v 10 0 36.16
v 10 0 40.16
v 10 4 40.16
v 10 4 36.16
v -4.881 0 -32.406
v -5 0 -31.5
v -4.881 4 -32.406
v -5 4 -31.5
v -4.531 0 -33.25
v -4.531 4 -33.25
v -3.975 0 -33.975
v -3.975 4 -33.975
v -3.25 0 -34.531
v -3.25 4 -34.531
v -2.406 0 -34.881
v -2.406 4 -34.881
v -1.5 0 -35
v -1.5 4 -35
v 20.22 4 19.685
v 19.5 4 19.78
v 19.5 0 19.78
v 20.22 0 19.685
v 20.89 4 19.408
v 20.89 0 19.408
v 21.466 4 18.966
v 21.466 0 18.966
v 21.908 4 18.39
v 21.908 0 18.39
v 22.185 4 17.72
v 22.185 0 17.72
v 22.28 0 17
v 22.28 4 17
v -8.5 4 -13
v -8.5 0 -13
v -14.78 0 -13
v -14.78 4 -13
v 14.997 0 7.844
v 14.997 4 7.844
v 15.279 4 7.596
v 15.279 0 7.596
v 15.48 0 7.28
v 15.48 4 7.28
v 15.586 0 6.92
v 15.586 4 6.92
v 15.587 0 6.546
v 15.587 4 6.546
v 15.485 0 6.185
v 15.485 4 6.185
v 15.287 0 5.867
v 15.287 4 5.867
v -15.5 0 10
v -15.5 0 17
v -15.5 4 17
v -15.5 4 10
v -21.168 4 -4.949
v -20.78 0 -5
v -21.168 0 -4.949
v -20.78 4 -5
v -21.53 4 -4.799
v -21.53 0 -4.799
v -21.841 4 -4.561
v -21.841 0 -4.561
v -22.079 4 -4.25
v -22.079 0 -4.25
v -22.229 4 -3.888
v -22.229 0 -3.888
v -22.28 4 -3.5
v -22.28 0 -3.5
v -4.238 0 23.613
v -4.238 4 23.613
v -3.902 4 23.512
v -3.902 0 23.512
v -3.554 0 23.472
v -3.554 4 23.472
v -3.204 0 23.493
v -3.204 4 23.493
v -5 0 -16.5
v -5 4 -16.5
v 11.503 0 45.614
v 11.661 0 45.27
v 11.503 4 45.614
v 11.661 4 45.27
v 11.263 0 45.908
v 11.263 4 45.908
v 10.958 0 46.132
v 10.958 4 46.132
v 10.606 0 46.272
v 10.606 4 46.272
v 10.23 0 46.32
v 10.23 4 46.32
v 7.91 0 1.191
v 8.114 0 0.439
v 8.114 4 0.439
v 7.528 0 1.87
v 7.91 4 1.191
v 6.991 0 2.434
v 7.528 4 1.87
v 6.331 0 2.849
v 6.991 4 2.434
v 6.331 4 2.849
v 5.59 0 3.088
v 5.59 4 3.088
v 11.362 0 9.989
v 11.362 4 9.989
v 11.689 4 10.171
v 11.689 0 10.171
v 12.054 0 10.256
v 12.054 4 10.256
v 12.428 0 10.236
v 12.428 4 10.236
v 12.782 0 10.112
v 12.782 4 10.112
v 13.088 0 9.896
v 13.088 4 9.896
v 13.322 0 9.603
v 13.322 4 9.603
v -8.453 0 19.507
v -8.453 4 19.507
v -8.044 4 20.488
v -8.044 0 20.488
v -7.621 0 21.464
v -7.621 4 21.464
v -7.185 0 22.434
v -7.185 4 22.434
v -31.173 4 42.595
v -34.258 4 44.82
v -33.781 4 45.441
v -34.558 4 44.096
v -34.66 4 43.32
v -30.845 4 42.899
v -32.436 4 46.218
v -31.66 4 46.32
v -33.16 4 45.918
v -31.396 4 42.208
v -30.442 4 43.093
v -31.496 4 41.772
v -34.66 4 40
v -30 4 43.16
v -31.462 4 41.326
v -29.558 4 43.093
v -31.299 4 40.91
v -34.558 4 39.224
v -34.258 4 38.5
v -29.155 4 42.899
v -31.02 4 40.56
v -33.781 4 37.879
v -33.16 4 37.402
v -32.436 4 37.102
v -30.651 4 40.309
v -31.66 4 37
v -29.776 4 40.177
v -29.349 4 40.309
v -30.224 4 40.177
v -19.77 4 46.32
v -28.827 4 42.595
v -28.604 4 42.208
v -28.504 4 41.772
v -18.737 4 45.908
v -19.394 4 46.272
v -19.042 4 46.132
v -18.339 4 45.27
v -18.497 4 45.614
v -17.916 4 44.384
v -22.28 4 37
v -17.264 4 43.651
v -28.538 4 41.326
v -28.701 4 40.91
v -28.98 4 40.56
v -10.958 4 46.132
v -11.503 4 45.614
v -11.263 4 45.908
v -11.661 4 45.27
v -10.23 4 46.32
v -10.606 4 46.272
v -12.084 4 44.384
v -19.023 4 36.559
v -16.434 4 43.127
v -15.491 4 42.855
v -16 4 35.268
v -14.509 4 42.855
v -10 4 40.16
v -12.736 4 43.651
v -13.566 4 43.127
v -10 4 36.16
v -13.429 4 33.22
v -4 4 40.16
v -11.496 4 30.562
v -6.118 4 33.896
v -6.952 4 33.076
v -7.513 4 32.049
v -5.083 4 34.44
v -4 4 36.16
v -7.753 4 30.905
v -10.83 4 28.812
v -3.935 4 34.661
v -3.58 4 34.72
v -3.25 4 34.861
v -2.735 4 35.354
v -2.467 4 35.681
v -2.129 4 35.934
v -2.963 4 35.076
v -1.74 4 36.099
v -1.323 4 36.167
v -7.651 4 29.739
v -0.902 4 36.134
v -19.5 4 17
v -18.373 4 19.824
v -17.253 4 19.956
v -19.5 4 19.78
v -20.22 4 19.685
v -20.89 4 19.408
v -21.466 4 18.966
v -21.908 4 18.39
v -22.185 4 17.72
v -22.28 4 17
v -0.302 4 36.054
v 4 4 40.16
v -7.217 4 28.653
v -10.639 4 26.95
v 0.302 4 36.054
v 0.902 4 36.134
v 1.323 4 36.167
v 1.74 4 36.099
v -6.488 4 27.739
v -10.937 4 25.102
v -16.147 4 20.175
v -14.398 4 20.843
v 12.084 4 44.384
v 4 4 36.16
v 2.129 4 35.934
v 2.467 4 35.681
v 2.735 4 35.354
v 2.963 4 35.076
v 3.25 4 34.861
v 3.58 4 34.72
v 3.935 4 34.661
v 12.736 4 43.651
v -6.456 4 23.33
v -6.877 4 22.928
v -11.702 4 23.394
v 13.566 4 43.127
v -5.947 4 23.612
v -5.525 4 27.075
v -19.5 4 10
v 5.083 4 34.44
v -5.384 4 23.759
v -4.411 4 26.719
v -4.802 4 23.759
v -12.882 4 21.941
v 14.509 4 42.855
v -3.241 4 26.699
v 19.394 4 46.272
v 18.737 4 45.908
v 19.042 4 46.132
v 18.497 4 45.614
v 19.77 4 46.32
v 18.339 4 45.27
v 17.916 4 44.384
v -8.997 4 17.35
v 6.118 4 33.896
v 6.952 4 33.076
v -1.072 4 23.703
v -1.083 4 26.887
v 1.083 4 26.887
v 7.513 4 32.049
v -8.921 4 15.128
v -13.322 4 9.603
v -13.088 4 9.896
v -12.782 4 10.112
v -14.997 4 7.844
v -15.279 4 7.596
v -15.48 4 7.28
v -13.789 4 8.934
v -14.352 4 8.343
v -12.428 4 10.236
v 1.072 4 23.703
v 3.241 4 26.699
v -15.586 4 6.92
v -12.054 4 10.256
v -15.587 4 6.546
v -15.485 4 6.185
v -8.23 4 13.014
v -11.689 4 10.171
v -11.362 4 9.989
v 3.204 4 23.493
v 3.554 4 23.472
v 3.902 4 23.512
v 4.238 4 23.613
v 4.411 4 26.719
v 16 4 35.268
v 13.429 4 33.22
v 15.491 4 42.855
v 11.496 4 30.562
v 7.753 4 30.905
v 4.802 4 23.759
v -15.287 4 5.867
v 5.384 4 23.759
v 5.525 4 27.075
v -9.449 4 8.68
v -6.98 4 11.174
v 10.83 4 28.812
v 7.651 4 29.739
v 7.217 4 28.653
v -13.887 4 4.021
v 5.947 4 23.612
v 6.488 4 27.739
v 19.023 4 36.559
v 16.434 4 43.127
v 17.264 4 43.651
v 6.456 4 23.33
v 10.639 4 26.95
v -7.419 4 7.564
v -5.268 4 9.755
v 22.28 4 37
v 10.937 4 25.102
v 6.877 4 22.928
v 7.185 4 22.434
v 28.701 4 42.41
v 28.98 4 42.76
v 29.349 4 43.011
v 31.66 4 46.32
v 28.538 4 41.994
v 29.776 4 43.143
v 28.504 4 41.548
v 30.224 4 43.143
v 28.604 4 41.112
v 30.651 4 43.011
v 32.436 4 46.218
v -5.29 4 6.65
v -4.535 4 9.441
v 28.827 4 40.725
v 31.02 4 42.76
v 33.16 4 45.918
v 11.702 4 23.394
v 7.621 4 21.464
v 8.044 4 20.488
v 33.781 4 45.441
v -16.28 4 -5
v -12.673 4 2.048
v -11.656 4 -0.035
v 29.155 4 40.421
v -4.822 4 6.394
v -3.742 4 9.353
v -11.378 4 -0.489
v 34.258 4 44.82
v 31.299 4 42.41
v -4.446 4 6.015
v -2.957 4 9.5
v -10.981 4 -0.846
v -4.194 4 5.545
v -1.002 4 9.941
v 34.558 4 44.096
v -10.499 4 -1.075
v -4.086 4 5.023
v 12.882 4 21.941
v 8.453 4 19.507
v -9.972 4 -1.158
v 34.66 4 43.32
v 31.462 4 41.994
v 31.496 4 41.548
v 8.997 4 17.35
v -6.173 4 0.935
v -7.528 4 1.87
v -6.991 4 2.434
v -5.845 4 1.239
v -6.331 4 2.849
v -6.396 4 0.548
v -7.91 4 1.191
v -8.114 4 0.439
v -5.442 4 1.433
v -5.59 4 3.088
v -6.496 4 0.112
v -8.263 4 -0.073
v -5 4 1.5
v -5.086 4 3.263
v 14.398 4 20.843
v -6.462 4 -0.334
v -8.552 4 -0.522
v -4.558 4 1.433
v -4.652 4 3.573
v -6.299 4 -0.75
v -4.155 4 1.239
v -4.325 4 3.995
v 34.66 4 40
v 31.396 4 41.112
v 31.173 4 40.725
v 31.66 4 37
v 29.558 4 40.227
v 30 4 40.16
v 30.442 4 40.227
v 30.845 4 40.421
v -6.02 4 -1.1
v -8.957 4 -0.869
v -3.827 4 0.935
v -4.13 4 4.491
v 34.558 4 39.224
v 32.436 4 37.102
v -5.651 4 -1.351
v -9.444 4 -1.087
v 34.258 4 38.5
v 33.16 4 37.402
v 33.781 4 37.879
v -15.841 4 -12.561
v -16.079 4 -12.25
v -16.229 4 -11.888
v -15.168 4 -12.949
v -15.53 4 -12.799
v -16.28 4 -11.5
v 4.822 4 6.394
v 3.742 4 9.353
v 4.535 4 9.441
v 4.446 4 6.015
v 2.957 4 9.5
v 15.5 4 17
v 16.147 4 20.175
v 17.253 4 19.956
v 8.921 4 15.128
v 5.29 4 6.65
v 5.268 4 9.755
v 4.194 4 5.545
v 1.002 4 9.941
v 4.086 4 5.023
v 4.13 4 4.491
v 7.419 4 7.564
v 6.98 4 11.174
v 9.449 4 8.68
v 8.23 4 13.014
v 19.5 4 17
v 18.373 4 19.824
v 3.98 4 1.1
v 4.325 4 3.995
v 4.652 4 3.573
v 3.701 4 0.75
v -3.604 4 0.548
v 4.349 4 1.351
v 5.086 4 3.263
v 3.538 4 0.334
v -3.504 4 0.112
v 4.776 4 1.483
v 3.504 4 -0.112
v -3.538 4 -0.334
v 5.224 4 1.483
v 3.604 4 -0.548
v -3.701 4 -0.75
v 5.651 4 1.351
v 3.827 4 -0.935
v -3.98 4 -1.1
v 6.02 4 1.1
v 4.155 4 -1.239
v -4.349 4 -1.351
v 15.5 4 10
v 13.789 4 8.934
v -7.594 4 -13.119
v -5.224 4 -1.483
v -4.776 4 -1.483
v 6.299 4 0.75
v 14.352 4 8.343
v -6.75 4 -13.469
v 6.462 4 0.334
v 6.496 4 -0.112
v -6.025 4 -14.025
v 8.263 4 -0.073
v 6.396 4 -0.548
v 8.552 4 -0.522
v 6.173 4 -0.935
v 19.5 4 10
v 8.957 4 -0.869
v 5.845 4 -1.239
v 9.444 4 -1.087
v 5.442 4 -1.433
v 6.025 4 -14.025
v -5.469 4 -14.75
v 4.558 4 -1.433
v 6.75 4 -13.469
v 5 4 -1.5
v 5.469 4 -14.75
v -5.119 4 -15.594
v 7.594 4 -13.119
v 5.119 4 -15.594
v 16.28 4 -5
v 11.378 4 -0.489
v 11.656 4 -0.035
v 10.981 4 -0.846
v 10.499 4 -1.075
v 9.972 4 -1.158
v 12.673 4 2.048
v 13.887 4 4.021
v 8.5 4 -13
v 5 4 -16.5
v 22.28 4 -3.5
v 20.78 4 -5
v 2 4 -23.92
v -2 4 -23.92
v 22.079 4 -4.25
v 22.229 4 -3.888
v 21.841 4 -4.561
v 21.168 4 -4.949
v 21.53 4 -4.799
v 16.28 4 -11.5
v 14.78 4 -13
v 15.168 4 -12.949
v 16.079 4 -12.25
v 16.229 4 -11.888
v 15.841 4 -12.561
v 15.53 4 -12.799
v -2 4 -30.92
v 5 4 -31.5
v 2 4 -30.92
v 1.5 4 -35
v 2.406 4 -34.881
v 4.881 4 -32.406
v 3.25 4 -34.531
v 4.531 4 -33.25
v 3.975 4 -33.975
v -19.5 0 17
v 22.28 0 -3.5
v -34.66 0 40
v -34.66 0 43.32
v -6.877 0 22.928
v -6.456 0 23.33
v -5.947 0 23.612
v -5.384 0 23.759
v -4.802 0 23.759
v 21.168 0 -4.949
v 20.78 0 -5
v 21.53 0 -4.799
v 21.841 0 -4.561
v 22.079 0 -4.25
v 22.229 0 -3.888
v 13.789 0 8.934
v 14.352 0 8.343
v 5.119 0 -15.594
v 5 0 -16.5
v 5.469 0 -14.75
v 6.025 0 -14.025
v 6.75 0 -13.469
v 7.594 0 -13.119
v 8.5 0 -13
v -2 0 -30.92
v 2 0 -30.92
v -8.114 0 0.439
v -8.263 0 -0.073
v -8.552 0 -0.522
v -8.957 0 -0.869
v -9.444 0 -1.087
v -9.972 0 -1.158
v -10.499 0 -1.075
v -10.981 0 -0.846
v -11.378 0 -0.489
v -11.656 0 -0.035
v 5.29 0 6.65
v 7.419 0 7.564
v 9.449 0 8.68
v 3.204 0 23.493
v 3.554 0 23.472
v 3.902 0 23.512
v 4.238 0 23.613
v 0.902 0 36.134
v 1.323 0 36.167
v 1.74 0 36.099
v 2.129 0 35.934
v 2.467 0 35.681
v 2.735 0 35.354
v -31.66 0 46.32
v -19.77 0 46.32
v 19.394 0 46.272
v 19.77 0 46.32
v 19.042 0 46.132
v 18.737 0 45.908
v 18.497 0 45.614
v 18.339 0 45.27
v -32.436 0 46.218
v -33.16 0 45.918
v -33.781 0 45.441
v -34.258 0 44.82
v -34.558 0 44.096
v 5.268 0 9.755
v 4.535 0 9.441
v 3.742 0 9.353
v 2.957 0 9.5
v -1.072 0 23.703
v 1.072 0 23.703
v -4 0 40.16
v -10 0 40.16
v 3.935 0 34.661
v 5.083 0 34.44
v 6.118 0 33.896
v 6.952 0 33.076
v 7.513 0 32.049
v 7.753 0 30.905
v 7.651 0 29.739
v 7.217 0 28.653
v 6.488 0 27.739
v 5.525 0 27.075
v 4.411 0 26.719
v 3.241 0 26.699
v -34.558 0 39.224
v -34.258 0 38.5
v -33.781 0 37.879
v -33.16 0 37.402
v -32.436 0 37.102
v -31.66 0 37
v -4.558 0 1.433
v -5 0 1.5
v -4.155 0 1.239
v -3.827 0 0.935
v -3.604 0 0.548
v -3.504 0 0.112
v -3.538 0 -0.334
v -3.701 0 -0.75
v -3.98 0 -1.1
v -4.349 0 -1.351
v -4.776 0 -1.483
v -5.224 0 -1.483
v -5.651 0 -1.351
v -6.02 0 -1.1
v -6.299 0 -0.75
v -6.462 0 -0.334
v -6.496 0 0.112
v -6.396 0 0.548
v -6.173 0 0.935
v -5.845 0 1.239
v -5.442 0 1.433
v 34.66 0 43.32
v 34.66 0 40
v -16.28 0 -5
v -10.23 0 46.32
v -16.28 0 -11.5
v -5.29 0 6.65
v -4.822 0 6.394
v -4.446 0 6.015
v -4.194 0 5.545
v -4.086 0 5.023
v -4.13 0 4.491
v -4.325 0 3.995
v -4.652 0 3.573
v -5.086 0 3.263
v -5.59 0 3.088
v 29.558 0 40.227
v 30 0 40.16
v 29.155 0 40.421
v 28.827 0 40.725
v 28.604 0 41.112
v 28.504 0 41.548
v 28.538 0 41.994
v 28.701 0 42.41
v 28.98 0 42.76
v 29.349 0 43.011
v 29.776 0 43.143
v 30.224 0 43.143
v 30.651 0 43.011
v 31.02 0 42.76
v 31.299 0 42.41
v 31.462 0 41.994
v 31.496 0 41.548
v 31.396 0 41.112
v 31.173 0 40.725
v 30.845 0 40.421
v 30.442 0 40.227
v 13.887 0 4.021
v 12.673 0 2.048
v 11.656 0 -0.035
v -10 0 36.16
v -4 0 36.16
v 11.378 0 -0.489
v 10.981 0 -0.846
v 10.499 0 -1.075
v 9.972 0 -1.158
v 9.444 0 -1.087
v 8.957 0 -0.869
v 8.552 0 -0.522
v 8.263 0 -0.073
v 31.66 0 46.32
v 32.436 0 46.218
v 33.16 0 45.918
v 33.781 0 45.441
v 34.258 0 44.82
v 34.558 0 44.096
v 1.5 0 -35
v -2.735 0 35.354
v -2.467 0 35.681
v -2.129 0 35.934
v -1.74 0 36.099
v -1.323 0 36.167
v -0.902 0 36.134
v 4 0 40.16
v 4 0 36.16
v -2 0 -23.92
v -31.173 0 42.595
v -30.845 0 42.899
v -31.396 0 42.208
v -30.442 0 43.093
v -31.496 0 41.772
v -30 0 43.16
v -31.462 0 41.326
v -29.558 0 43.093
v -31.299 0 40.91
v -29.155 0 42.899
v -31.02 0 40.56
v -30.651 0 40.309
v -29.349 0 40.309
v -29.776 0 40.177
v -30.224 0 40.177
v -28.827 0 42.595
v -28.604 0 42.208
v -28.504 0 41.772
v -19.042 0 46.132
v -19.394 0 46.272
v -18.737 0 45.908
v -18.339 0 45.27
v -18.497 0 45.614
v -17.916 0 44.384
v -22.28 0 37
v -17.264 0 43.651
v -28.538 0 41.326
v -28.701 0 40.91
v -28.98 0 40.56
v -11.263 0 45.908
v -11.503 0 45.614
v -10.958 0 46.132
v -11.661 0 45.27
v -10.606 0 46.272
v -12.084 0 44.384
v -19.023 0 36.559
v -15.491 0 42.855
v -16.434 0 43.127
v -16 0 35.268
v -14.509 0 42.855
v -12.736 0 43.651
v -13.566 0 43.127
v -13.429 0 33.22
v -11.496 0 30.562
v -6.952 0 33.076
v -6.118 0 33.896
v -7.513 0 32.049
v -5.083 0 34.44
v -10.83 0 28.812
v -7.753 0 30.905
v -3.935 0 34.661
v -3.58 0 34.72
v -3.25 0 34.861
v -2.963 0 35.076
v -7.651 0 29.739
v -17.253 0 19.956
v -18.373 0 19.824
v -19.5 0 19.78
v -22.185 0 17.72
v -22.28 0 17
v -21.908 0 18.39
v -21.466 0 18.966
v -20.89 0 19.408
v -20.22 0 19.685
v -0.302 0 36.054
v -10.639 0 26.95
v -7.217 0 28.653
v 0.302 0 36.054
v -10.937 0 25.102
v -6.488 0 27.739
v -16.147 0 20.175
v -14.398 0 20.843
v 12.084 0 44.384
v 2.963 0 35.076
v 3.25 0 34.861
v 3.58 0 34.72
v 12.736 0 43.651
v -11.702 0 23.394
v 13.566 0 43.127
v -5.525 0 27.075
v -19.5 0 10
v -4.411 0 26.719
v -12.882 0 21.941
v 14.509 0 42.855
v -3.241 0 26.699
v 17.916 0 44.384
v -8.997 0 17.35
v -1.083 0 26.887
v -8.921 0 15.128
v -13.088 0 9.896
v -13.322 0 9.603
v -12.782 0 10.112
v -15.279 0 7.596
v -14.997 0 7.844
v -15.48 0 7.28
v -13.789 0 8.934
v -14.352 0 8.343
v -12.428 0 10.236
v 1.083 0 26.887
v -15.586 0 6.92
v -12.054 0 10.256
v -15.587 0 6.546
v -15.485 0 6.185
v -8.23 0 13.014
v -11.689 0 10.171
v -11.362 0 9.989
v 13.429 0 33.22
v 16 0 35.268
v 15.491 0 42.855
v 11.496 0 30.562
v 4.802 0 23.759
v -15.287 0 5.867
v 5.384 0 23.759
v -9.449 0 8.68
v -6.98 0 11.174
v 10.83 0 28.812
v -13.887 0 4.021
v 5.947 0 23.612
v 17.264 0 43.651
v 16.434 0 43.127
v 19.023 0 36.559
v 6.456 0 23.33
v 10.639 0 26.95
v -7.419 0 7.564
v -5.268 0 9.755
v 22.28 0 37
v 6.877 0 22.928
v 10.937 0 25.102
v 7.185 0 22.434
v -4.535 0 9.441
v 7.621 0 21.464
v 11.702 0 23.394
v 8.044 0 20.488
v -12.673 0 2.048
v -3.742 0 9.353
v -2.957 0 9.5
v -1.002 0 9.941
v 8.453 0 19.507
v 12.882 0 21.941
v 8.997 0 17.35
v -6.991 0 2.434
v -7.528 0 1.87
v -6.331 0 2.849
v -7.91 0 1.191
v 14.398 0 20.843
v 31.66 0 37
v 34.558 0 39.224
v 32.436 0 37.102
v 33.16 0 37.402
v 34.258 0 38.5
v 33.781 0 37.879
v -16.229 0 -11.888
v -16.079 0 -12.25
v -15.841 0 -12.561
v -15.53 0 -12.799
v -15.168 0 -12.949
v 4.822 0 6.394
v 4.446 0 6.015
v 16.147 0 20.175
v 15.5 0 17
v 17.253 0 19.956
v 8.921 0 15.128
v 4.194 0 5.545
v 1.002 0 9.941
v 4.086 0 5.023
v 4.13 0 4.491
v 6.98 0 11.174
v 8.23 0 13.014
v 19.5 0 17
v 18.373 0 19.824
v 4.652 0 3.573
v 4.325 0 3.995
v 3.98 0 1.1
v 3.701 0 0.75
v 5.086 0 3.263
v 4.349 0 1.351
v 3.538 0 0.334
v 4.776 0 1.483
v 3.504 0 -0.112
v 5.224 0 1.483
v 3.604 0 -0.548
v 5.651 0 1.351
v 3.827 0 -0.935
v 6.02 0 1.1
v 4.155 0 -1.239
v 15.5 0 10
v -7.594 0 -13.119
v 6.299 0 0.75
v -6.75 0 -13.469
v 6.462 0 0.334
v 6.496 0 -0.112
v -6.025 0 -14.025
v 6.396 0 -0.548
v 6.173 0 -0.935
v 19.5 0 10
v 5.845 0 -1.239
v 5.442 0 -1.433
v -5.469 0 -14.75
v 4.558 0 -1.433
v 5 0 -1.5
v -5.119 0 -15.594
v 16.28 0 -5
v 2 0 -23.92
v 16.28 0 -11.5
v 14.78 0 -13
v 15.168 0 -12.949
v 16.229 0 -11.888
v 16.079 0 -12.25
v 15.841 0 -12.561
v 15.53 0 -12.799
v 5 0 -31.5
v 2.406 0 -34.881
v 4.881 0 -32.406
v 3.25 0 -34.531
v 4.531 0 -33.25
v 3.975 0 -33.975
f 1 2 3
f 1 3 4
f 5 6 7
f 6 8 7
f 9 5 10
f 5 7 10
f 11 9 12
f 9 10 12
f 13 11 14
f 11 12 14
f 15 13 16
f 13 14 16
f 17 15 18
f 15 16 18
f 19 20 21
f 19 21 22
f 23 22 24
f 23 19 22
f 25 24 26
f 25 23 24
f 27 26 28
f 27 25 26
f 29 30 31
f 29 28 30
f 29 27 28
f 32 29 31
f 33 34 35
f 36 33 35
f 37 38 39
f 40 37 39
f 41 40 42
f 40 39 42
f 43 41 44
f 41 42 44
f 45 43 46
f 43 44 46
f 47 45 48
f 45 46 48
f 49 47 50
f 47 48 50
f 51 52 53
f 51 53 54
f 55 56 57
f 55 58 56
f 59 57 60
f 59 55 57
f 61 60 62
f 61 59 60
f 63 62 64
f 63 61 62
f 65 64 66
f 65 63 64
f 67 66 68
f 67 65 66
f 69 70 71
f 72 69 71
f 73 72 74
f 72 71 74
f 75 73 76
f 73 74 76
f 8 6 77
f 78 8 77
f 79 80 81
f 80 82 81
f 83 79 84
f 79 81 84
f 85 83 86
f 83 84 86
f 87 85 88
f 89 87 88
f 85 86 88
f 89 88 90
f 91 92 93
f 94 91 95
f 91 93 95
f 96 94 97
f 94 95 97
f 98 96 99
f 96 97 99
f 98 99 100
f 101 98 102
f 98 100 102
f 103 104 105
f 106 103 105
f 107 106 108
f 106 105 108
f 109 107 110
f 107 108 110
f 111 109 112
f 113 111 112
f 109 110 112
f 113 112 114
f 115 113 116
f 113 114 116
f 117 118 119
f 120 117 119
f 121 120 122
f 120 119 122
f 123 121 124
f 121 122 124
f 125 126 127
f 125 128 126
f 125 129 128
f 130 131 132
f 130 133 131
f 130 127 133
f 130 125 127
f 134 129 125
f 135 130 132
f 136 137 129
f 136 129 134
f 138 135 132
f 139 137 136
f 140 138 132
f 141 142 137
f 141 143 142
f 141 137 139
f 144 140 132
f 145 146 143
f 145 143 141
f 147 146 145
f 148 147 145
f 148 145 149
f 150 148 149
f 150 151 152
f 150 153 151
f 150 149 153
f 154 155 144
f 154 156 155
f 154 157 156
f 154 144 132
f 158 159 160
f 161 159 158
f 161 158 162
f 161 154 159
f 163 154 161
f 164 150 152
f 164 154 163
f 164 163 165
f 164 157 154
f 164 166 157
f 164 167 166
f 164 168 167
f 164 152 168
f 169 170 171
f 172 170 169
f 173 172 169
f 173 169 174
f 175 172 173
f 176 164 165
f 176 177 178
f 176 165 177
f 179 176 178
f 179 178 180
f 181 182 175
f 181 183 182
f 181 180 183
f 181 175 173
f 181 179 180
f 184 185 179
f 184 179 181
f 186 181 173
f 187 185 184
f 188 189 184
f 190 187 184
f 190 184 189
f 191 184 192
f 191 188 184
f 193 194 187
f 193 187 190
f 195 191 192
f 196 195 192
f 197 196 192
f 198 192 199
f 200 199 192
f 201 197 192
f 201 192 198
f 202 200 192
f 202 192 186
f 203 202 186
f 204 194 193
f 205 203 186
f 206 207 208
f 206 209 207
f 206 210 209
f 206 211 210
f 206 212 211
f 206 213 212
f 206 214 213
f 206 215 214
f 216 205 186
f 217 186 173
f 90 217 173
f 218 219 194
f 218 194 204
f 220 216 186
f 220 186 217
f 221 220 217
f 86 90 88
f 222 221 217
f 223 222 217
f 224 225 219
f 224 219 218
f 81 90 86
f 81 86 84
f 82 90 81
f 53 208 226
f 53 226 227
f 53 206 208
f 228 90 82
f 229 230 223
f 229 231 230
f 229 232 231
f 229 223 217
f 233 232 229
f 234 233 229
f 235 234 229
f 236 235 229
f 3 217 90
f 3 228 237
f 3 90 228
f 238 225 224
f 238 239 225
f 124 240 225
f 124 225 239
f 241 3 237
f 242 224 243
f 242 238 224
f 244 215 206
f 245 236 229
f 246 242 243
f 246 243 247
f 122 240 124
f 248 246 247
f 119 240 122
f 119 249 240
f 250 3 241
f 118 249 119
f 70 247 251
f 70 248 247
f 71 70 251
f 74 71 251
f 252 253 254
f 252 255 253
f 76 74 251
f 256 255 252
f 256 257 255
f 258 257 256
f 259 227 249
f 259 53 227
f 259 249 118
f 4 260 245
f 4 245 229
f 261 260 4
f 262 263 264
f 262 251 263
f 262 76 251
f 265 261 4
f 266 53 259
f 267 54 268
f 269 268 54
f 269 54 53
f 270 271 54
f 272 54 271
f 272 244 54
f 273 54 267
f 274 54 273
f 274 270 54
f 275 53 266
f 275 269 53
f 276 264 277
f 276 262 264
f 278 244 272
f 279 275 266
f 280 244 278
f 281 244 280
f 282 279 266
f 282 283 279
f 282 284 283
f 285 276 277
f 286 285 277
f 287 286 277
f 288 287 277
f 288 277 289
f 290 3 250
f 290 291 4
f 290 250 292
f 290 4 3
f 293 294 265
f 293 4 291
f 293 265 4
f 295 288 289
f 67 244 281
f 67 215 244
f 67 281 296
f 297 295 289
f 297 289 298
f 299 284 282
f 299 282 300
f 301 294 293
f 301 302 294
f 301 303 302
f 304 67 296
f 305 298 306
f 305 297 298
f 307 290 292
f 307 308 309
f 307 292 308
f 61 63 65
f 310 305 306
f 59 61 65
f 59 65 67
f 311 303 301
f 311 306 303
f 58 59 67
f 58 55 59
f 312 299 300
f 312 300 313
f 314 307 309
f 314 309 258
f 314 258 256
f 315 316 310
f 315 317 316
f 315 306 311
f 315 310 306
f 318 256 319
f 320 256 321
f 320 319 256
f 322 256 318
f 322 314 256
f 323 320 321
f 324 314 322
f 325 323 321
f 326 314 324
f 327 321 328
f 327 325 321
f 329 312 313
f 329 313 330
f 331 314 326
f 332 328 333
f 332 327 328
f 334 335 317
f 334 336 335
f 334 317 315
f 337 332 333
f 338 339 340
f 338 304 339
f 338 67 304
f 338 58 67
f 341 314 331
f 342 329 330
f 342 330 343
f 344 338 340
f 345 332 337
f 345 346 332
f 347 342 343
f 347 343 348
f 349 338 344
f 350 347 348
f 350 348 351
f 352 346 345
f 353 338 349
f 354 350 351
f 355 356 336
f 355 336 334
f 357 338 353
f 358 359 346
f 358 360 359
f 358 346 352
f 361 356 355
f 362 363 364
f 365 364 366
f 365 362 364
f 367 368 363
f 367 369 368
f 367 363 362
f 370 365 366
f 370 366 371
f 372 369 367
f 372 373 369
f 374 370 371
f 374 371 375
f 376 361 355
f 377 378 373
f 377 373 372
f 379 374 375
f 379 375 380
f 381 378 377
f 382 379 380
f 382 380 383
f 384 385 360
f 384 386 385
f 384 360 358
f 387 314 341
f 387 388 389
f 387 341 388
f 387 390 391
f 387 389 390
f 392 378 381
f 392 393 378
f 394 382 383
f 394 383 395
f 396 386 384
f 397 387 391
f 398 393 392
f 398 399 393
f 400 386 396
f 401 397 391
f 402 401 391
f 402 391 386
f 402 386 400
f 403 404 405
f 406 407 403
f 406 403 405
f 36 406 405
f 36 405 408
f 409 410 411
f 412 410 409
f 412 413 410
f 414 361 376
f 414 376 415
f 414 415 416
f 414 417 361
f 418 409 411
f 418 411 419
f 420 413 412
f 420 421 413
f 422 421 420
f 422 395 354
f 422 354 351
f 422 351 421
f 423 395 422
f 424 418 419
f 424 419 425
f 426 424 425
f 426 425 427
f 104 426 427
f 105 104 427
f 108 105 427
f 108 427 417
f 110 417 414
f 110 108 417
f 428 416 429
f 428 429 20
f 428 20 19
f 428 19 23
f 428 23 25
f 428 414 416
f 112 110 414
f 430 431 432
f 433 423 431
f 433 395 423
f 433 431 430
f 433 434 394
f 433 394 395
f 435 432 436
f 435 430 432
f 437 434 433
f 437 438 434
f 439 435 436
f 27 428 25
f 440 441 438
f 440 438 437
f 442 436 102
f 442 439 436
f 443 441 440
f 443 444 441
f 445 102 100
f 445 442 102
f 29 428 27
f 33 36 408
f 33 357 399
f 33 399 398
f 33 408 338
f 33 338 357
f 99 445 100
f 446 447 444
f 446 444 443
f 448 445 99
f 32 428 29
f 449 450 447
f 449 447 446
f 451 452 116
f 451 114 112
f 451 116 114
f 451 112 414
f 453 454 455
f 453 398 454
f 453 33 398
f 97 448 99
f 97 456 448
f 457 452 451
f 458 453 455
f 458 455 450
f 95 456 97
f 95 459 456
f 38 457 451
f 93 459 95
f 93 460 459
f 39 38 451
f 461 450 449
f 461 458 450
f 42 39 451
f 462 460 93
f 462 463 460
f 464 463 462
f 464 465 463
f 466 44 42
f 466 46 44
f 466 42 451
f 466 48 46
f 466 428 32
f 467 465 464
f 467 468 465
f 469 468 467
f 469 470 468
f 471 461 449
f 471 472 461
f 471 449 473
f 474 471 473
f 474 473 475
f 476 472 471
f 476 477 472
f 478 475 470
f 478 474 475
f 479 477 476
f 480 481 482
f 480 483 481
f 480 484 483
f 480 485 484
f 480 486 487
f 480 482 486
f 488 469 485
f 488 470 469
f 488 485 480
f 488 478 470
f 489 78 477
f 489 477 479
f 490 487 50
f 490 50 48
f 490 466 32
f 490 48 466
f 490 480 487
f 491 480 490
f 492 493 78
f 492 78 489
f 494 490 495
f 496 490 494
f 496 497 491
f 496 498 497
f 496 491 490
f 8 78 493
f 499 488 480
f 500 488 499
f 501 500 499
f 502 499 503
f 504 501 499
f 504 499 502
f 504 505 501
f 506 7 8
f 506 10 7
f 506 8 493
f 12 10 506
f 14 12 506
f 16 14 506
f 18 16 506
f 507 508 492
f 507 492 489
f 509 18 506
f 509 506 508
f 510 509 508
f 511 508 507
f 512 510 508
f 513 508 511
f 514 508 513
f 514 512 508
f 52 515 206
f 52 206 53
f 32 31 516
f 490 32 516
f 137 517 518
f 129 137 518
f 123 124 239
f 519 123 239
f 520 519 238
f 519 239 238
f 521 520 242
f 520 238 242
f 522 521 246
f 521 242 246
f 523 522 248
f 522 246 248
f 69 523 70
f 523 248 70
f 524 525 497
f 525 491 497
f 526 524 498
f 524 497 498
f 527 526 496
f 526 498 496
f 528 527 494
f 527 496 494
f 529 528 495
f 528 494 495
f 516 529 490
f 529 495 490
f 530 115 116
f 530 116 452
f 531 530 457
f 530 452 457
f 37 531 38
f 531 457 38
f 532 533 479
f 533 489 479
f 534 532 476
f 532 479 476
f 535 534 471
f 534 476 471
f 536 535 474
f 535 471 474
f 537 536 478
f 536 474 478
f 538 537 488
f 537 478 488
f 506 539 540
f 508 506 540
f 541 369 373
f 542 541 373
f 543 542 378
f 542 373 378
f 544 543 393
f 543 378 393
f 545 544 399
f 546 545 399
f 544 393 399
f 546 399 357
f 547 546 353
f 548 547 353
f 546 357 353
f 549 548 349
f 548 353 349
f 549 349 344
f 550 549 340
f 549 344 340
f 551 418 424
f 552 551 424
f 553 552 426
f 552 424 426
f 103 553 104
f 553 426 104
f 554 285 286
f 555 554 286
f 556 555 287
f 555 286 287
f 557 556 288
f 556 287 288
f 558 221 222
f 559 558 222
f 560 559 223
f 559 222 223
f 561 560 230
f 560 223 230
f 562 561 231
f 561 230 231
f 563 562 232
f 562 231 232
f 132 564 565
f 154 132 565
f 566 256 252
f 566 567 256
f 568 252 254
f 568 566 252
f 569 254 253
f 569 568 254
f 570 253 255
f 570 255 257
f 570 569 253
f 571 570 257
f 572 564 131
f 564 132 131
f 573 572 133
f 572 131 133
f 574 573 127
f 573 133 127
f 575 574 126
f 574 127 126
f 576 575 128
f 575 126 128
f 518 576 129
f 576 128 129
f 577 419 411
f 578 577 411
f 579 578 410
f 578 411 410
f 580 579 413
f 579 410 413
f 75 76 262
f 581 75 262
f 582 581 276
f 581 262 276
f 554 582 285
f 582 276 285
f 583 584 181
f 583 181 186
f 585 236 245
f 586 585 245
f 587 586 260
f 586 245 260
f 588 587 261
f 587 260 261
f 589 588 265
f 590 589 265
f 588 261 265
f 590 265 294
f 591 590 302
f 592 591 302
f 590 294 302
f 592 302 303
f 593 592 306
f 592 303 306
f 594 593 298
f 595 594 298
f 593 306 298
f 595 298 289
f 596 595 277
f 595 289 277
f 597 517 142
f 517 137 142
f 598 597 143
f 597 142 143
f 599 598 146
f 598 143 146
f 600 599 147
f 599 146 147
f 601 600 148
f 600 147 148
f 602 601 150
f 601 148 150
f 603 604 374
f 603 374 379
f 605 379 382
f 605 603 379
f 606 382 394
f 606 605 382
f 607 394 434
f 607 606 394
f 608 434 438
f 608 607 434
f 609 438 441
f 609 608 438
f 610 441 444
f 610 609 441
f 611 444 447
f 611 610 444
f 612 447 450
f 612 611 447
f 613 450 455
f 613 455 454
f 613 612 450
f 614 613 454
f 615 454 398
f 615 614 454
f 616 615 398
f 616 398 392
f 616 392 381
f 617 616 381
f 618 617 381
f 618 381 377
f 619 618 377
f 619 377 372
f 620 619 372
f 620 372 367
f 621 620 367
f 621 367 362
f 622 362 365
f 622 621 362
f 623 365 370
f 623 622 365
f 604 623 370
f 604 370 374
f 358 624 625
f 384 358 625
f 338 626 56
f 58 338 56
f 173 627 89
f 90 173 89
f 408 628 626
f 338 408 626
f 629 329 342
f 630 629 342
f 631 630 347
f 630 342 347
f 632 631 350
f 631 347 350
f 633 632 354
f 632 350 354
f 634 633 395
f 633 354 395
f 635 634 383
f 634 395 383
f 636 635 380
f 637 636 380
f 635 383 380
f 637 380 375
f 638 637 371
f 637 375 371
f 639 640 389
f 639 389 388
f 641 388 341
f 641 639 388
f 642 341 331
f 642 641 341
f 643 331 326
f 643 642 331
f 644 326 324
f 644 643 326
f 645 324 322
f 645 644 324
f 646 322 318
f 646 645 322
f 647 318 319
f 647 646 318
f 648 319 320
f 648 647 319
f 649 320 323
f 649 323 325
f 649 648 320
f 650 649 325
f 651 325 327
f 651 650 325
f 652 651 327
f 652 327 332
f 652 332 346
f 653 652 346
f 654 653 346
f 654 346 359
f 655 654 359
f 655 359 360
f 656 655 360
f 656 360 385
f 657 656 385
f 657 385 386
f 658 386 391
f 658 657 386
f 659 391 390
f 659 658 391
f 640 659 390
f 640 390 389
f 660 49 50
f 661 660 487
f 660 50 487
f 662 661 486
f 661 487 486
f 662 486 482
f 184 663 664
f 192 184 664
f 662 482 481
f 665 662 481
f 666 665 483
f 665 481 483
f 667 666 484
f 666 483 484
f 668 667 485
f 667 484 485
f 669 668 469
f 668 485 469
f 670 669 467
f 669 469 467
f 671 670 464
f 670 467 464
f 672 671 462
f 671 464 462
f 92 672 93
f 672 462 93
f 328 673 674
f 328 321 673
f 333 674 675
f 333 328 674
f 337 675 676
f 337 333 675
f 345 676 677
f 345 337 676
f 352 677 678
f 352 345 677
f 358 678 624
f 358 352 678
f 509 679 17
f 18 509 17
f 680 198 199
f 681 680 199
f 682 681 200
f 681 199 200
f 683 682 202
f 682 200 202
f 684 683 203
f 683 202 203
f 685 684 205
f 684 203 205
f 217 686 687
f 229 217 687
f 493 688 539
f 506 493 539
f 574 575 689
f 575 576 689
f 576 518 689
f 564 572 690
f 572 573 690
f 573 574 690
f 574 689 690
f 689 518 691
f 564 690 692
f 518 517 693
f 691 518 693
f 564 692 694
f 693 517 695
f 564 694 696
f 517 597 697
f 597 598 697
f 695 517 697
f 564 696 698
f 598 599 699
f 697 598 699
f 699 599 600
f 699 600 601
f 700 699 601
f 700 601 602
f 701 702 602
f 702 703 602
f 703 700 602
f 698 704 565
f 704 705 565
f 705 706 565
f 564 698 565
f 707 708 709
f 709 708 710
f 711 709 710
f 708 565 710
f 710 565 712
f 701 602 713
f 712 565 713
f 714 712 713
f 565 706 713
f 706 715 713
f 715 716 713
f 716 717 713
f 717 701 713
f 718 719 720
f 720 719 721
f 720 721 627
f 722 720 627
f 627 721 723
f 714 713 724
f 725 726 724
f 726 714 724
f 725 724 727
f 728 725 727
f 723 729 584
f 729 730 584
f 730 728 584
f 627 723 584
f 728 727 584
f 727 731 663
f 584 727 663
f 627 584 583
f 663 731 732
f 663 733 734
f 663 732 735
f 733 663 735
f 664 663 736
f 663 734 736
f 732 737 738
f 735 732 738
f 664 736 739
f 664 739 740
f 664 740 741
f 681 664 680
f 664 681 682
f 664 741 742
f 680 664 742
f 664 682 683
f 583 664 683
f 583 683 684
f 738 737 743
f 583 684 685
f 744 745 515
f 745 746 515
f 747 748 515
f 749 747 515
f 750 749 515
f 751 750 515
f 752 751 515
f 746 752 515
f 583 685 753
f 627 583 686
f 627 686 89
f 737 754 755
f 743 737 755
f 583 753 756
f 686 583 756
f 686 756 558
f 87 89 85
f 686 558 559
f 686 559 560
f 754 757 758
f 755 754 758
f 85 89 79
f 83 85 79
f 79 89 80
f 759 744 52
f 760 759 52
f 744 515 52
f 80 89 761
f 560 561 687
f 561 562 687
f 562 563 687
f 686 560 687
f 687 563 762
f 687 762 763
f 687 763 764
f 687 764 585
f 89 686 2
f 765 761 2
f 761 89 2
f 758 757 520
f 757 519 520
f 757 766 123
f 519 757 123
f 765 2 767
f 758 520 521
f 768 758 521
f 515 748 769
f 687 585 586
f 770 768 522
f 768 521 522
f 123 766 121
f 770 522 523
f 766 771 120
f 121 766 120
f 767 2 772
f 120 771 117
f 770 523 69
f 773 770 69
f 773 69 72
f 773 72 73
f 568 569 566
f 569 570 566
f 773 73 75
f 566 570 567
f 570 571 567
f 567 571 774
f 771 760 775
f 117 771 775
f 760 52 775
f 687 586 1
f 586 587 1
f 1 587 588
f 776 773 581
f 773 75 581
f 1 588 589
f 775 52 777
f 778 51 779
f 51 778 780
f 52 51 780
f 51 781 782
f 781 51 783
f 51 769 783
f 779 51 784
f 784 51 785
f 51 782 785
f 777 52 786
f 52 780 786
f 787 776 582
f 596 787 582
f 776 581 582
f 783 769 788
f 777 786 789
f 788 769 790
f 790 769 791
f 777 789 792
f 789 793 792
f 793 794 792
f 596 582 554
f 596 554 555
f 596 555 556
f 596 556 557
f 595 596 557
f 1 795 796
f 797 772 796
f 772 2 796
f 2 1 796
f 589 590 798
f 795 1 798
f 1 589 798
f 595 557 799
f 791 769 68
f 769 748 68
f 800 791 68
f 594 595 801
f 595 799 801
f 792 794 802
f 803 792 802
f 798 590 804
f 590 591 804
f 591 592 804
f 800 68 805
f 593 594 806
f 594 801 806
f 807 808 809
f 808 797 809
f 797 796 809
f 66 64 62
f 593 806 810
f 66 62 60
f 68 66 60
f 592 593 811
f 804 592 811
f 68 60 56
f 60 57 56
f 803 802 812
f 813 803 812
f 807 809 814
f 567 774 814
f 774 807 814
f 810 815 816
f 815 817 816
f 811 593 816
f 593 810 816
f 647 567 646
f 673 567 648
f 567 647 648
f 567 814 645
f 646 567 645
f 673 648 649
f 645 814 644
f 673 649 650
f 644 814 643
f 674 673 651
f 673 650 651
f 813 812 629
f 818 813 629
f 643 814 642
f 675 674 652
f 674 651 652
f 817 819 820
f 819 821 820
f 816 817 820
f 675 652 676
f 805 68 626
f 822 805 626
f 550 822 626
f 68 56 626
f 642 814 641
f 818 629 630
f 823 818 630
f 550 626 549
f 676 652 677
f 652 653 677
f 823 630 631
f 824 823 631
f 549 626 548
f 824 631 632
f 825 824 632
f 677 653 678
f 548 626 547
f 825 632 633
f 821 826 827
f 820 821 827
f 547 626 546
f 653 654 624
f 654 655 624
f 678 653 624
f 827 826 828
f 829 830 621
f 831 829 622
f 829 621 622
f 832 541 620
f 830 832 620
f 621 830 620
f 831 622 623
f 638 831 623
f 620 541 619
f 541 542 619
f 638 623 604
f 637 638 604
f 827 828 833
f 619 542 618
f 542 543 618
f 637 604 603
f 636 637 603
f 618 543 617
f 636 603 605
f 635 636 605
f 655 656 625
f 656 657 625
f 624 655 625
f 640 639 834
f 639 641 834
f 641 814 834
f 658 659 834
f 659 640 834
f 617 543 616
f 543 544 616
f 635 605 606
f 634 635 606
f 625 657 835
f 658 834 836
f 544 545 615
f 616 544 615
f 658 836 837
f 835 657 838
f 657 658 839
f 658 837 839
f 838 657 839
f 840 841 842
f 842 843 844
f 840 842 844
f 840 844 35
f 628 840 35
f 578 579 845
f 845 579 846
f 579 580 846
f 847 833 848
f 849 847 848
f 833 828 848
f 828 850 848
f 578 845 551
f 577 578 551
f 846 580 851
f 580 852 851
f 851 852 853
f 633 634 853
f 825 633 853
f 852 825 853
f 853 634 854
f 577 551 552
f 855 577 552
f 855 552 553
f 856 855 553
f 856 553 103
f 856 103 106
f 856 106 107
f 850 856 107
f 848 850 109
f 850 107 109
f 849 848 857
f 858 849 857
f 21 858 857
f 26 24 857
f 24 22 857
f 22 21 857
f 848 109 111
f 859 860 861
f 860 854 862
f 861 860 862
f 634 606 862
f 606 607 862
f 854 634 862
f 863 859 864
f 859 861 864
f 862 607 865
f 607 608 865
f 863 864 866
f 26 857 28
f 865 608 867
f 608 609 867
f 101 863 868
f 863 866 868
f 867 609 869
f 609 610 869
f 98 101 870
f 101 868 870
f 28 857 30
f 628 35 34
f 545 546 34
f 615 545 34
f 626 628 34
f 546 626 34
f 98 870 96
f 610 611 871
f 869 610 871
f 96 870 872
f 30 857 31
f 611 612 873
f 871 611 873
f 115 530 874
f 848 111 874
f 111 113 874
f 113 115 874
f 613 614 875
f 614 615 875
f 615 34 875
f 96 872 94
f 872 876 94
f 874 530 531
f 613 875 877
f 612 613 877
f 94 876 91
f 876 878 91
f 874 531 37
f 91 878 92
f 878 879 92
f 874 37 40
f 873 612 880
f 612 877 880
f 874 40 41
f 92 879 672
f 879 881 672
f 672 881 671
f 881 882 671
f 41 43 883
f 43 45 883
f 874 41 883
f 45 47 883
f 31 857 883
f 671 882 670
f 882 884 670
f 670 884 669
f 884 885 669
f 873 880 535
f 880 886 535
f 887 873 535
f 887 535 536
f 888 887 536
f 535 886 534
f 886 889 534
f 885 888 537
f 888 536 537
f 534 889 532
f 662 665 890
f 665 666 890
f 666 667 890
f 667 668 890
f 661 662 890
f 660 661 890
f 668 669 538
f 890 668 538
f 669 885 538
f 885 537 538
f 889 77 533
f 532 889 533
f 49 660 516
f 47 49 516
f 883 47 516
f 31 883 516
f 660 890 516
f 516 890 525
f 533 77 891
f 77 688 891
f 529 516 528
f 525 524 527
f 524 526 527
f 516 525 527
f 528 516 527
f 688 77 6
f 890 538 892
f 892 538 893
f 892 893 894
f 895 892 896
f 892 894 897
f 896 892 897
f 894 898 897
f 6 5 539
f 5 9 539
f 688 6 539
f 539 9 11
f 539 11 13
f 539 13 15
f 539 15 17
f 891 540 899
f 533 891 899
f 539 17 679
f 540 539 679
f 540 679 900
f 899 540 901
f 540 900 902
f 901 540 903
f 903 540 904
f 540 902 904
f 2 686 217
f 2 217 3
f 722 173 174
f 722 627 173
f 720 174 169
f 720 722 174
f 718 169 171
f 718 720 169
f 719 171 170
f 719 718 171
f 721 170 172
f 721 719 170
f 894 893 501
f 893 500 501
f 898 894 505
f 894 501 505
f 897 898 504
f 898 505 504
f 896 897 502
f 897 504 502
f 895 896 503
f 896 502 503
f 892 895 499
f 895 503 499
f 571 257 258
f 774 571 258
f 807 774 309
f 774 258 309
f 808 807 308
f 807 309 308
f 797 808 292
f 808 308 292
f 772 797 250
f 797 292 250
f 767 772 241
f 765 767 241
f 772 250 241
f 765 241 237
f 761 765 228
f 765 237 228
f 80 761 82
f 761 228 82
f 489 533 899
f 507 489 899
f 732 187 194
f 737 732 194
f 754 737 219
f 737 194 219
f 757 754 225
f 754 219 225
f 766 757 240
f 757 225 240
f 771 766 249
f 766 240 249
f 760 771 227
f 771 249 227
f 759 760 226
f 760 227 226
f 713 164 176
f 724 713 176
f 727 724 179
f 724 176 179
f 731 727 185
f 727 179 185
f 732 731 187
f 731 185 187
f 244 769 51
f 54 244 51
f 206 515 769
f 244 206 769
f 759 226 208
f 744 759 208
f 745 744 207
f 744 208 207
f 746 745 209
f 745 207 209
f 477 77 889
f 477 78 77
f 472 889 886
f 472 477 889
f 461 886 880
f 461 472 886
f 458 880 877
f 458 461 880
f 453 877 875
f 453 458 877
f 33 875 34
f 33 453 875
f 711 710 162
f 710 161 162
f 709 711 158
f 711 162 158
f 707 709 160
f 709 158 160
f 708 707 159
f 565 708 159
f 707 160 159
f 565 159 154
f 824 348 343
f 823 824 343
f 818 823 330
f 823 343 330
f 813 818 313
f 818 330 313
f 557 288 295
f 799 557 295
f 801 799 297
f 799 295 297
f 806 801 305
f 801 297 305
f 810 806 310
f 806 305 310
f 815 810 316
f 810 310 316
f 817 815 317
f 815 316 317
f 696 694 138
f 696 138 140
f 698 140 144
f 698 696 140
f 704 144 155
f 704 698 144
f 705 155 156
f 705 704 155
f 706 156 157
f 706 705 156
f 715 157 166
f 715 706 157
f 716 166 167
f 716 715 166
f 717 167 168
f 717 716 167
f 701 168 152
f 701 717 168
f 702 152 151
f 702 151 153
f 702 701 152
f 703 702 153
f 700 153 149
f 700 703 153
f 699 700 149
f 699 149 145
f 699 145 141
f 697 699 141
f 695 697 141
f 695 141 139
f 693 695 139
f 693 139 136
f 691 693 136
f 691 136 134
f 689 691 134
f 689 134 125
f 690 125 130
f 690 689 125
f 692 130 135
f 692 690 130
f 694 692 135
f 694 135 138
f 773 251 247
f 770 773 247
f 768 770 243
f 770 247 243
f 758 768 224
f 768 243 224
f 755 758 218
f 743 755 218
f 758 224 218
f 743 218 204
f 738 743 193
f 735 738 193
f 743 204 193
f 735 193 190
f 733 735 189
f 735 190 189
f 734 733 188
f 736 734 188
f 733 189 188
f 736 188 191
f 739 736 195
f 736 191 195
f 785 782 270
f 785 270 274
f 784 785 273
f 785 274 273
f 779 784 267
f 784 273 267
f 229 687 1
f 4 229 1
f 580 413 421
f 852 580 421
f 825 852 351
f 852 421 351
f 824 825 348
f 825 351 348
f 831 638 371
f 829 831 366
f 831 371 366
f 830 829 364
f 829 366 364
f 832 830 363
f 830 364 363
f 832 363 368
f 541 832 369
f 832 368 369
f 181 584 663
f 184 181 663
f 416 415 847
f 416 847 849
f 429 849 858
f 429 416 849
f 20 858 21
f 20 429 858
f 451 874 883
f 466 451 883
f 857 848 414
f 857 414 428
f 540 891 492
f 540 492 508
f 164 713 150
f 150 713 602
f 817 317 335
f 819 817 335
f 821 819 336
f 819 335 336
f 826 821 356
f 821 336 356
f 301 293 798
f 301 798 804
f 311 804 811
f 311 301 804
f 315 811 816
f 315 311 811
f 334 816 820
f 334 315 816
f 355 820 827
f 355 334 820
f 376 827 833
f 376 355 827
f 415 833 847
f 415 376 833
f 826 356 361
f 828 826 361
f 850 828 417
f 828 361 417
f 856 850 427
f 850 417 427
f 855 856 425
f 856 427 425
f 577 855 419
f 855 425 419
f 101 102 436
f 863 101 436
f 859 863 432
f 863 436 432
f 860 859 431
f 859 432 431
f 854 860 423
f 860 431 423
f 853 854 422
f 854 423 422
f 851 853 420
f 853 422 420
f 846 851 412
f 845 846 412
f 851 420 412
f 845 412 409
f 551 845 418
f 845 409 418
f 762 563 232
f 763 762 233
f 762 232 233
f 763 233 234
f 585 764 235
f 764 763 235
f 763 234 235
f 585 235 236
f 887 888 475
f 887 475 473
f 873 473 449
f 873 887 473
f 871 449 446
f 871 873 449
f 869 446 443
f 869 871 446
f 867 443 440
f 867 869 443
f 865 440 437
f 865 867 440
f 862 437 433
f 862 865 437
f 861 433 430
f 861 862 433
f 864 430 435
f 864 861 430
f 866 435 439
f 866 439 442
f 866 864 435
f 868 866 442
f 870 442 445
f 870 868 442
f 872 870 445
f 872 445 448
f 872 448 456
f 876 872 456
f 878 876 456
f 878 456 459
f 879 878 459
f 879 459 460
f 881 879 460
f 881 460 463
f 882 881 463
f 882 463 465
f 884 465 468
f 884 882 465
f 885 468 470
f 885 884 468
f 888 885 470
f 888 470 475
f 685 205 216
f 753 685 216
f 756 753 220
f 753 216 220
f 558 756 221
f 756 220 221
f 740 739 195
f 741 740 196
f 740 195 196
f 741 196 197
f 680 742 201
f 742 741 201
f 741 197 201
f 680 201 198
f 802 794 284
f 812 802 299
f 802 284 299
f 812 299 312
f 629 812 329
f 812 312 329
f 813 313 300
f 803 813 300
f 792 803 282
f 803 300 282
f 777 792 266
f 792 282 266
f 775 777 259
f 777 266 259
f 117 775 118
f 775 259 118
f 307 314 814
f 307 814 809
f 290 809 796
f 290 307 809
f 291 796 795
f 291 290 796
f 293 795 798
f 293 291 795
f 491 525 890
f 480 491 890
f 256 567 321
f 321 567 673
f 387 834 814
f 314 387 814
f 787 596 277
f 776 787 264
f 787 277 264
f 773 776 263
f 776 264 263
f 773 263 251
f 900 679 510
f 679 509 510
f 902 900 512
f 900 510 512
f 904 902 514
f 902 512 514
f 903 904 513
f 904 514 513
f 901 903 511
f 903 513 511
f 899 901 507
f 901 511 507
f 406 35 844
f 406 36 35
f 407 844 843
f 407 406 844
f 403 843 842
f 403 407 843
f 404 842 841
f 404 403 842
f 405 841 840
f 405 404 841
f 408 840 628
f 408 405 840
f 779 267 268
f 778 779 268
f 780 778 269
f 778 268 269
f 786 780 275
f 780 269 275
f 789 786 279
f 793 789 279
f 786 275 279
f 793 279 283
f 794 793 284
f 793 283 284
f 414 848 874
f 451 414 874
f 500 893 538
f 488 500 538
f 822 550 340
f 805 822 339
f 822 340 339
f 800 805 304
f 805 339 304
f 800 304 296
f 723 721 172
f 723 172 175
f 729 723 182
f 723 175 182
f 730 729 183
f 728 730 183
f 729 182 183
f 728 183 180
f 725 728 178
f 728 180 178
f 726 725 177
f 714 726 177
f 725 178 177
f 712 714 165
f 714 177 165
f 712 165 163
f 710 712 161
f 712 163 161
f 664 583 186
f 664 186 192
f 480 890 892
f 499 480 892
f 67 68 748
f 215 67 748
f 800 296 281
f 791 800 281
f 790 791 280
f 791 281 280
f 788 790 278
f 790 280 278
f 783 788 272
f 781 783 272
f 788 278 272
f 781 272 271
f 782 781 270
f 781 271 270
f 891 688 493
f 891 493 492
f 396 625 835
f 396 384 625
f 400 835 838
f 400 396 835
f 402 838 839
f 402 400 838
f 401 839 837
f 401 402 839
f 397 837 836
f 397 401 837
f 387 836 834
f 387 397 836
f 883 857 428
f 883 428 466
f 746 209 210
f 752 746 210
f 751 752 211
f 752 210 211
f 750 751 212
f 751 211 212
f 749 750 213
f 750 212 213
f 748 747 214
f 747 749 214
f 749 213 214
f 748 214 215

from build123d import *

# Parameters (mm, degrees)
ESQUISSE1_R             = 1.5
ESQUISSE1_W             = 4
ESQUISSE1_H             = 7
ESQUISSE1_W_2           = 6
ESQUISSE1_H_2           = 4
BOSS_EXTRU_1_DEPTH      = 4
ENL_V_MAT_EXTRU_1_REACH = 59.99
ENL_V_MAT_EXTRU_2_REACH = 59.99
ENL_V_MAT_EXTRU_3_REACH = 59.99
CONG_1_R                = 3.5
CONG_2_R                = 3.5
CONG_3_R                = 1.5
ENL_V_MAT_EXTRU_4_REACH = 59.99
CONG_4_R                = 3
CONG_5_R                = 3
ENL_V_MAT_EXTRU_5_REACH = 59.99
ESQUISSE8_R             = 3.5
CONG_6_R                = 1.5


with BuildPart() as part:
    # Esquisse1 → Boss.-Extru.1 (new body)
    with BuildSketch(Plane(origin=(0, 0, 0), x_dir=(1, 0, 0), z_dir=(0, 1, 0))):
        Polygon((-20.28, 5), (-22.28, 5), (-22.28, -37), (-34.66, -37), (-34.66, -46.32), (34.66, -46.32), (34.66, -37), (22.28, -37), (22.28, 5), (20.28, 5), (16.28, 5), (16.28, 13), (5, 13), (5, 35), (-5, 35), (-5, 13), (-16.28, 13), (-16.28, 5), align=None)
        with Locations(Location((-5, 0, 0), (0, 0, 270))):
            Circle(ESQUISSE1_R, mode=Mode.SUBTRACT)
        with Locations(Location((5, 0, 0), (0, 0, 90))):
            Circle(ESQUISSE1_R, mode=Mode.SUBTRACT)
        with Locations(Location((-30, -41.66, 0), (0, 0, 270))):
            Circle(ESQUISSE1_R, mode=Mode.SUBTRACT)
        with Locations(Location((30, -41.66, 0), (0, 0, 90))):
            Circle(ESQUISSE1_R, mode=Mode.SUBTRACT)
        with Locations((0, 27.42)):
            Rectangle(ESQUISSE1_W, ESQUISSE1_H, mode=Mode.SUBTRACT)
        with Locations((-17.5, -13.5)):
            Rectangle(ESQUISSE1_W, ESQUISSE1_H, mode=Mode.SUBTRACT)
        with Locations((-7, -38.16)):
            Rectangle(ESQUISSE1_W_2, ESQUISSE1_H_2, mode=Mode.SUBTRACT)
        with Locations((7, -38.16)):
            Rectangle(ESQUISSE1_W_2, ESQUISSE1_H_2, mode=Mode.SUBTRACT)
        with Locations((17.5, -13.5)):
            Rectangle(ESQUISSE1_W, ESQUISSE1_H, mode=Mode.SUBTRACT)
    extrude(amount=BOSS_EXTRU_1_DEPTH)

    # Esquisse2 → Enlèv. mat.-Extru.1 (cut, up to next)
    with BuildSketch(Plane(origin=(0, 4, 0), x_dir=(1, 0, 0), z_dir=(0, 1, 0)), mode=Mode.PRIVATE) as enl_v_mat_extru_1_sk1:
        with BuildLine():
            ThreePointArc((-14.9974668, -7.843519448), (-14.058937243, -8.627559279), (-13.321584394, -9.603195975))
            ThreePointArc((-13.321584394, -9.603195975), (-12.428040198, -10.235555734), (-11.361521034, -9.988904221))
            ThreePointArc((-11.361521034, -9.988904221), (-8.447920047, -8.097394436), (-5.290042477, -6.650090308))
            ThreePointArc((-5.290042477, -6.650090308), (-4.088898303, -4.755535803), (-5.589901119, -3.088480121))
            ThreePointArc((-5.589901119, -3.088480121), (-7.276914991, -2.168490468), (-8.113566287, -0.438631695))
            ThreePointArc((-8.113566287, -0.438631695), (-9.70546362, 1.141857781), (-11.656322949, 0.034504187))
            ThreePointArc((-11.656322949, 0.034504187), (-13.25585737, -3.049060247), (-15.287160414, -5.866982872))
            ThreePointArc((-15.287160414, -5.866982872), (-15.585513038, -6.920209252), (-14.9974668, -7.843519448))
        make_face()
    enl_v_mat_extru_1_tool1 = extrude(enl_v_mat_extru_1_sk1.sketch, amount=-ENL_V_MAT_EXTRU_1_REACH, mode=Mode.PRIVATE) & part.part
    # Esquisse2 → Enlèv. mat.-Extru.1 (cut, up to next)
    with BuildSketch(Plane(origin=(0, 4, 0), x_dir=(1, 0, 0), z_dir=(0, 1, 0)), mode=Mode.PRIVATE) as enl_v_mat_extru_1_sk2:
        with BuildLine():
            ThreePointArc((5.589901119, -3.088480121), (4.088898303, -4.755535803), (5.290042477, -6.650090308))
            ThreePointArc((5.290042477, -6.650090308), (8.447920047, -8.097394436), (11.361521034, -9.988904221))
            ThreePointArc((11.361521034, -9.988904221), (12.428040198, -10.235555734), (13.321584394, -9.603195975))
            ThreePointArc((13.321584394, -9.603195975), (14.058937243, -8.627559279), (14.9974668, -7.843519448))
            ThreePointArc((14.9974668, -7.843519448), (15.585513038, -6.920209252), (15.287160414, -5.866982872))
            ThreePointArc((15.287160414, -5.866982872), (13.25585737, -3.049060247), (11.656322949, 0.034504187))
            ThreePointArc((11.656322949, 0.034504187), (9.70546362, 1.141857781), (8.113566287, -0.438631695))
            ThreePointArc((8.113566287, -0.438631695), (7.276914991, -2.168490468), (5.589901119, -3.088480121))
        make_face()
    enl_v_mat_extru_1_tool2 = extrude(enl_v_mat_extru_1_sk2.sketch, amount=-ENL_V_MAT_EXTRU_1_REACH, mode=Mode.PRIVATE) & part.part
    add(enl_v_mat_extru_1_tool1.solids().sort_by_distance((-10.104676, 4, 4.861596))[0], mode=Mode.SUBTRACT)
    add(enl_v_mat_extru_1_tool2.solids().sort_by_distance((10.104676, 4, 4.861596))[0], mode=Mode.SUBTRACT)

    # Esquisse3 → Enlèv. mat.-Extru.2 (cut, up to next)
    with BuildSketch(Plane(origin=(0, 4, 0), x_dir=(1, 0, 0), z_dir=(0, 1, 0)), mode=Mode.PRIVATE) as enl_v_mat_extru_2_sk1:
        with BuildLine():
            ThreePointArc((-3.934570919, -34.661427668), (-3.25, -34.860961894), (-2.734912831, -35.354050587))
            ThreePointArc((-2.734912831, -35.354050587), (-1.93927123, -36.028172694), (-0.901821799, -36.133931151))
            ThreePointArc((-0.901821799, -36.133931151), (0, -36.043871504), (0.901821799, -36.133931151))
            ThreePointArc((0.901821799, -36.133931151), (1.93927123, -36.028172694), (2.734912831, -35.354050587))
            ThreePointArc((2.734912831, -35.354050587), (3.25, -34.860961894), (3.934570919, -34.661427668))
            ThreePointArc((3.934570919, -34.661427668), (7.745022524, -30.318334752), (3.241418184, -26.699005331))
            ThreePointArc((3.241418184, -26.699005331), (0, -26.910051622), (-3.241418184, -26.699005331))
            ThreePointArc((-3.241418184, -26.699005331), (-7.745022524, -30.318334752), (-3.934570919, -34.661427668))
        make_face()
    enl_v_mat_extru_2_tool1 = extrude(enl_v_mat_extru_2_sk1.sketch, amount=-ENL_V_MAT_EXTRU_2_REACH, mode=Mode.PRIVATE) & part.part
    add(enl_v_mat_extru_2_tool1.solids().sort_by_distance((0, 4, 31.014631))[0], mode=Mode.SUBTRACT)

    # Esquisse4 → Enlèv. mat.-Extru.3 (cut, up to next)
    with BuildSketch(Plane(origin=(0, 4, 0), x_dir=(1, 0, 0), z_dir=(0, 1, 0)), mode=Mode.PRIVATE) as enl_v_mat_extru_3_sk1:
        with BuildLine():
            ThreePointArc((-3.204236741, -23.492683837), (0, -23.72926901), (3.204236741, -23.492683837))
            ThreePointArc((3.204236741, -23.492683837), (3.729211384, -23.484474006), (4.238200501, -23.613298912))
            ThreePointArc((4.238200501, -23.613298912), (5.947114761, -23.612368685), (7.184676805, -22.433882792))
            ThreePointArc((7.184676805, -22.433882792), (7.833923694, -20.976940348), (8.452629907, -19.506768443))
            ThreePointArc((8.452629907, -19.506768443), (8.650133896, -14.04633429), (5.268411363, -9.754562897))
            ThreePointArc((5.268411363, -9.754562897), (4.141434744, -9.367776338), (2.957336552, -9.500409716))
            ThreePointArc((2.957336552, -9.500409716), (0, -9.996838884), (-2.957336552, -9.500409716))
            ThreePointArc((-2.957336552, -9.500409716), (-4.141434744, -9.367776338), (-5.268411363, -9.754562897))
            ThreePointArc((-5.268411363, -9.754562897), (-8.650133896, -14.04633429), (-8.452629907, -19.506768443))
            ThreePointArc((-8.452629907, -19.506768443), (-7.833923694, -20.976940348), (-7.184676805, -22.433882792))
            ThreePointArc((-7.184676805, -22.433882792), (-5.947114761, -23.612368685), (-4.238200501, -23.613298912))
            ThreePointArc((-4.238200501, -23.613298912), (-3.729211384, -23.484474006), (-3.204236741, -23.492683837))
        make_face()
    enl_v_mat_extru_3_tool1 = extrude(enl_v_mat_extru_3_sk1.sketch, amount=-ENL_V_MAT_EXTRU_3_REACH, mode=Mode.PRIVATE) & part.part
    add(enl_v_mat_extru_3_tool1.solids().sort_by_distance((0, 4, 16.711487))[0], mode=Mode.SUBTRACT)

    # Congé1
    cong_1_edges = [part.edges().sort_by_distance(p)[0] for p in [
        (-5, 2, -35),
        (5, 2, -35),
    ]]
    fillet(cong_1_edges, radius=CONG_1_R)

    # Congé2
    cong_2_edges = [part.edges().sort_by_distance(p)[0] for p in [
        (-5, 2, -13),
        (5, 2, -13),
    ]]
    fillet(cong_2_edges, radius=CONG_2_R)

    # Congé3
    cong_3_edges = [part.edges().sort_by_distance(p)[0] for p in [
        (22.28, 2, -5),
        (-22.28, 2, -5),
        (-16.28, 2, -13),
        (16.28, 2, -13),
    ]]
    fillet(cong_3_edges, radius=CONG_3_R)

    # Esquisse7 → Enlèv. mat.-Extru.4 (cut, up to next)
    with BuildSketch(Plane(origin=(0, 4, 0), x_dir=(1, 0, 0), z_dir=(0, 1, 0)), mode=Mode.PRIVATE) as enl_v_mat_extru_4_sk1:
        with BuildLine():
            Line((-22.28, -17), (-22.28, -37))
            ThreePointArc((-22.28, -37), (-16.000012961, -35.267986448), (-11.495708343, -30.561677059))
            ThreePointArc((-11.495708343, -30.561677059), (-11.263143502, -24.222708134), (-16.146891575, -20.174792843))
            ThreePointArc((-16.146891575, -20.174792843), (-17.81186512, -19.879037913), (-19.5, -19.78))
            ThreePointArc((-19.5, -19.78), (-21.465756852, -18.965756852), (-22.28, -17))
        make_face()
    enl_v_mat_extru_4_tool1 = extrude(enl_v_mat_extru_4_sk1.sketch, amount=-ENL_V_MAT_EXTRU_4_REACH, mode=Mode.PRIVATE) & part.part
    enl_v_mat_extru_4 = enl_v_mat_extru_4_tool1.solids().sort_by_distance((-17.328715, 4, 27.806477))[0]
    add(enl_v_mat_extru_4, mode=Mode.SUBTRACT)

    # Symétrie1: Enlèv. mat.-Extru.4 across plane
    add(enl_v_mat_extru_4.mirror(Plane(origin=(0, 0, 0), x_dir=(0, 0, 1), z_dir=(1, 0, 0))), mode=Mode.SUBTRACT)

    # Congé4
    cong_4_edges = [part.edges().sort_by_distance(p)[0] for p in [
        (-34.66, 2, 46.32),
        (-34.66, 2, 37),
    ]]
    fillet(cong_4_edges, radius=CONG_4_R)

    # Congé5
    cong_5_edges = [part.edges().sort_by_distance(p)[0] for p in [
        (34.66, 2, 37),
        (34.66, 2, 46.32),
    ]]
    fillet(cong_5_edges, radius=CONG_5_R)

    # Esquisse8 → Enlèv. mat.-Extru.5 (cut, up to next)
    with BuildSketch(Plane(origin=(0, 4, 0), x_dir=(1, 0, 0), z_dir=(0, 1, 0)), mode=Mode.PRIVATE) as enl_v_mat_extru_5_sk1:
        with Locations((-15, -46.32)):
            Circle(ESQUISSE8_R)
    enl_v_mat_extru_5_tool1 = extrude(enl_v_mat_extru_5_sk1.sketch, amount=-ENL_V_MAT_EXTRU_5_REACH, mode=Mode.PRIVATE) & part.part
    # Esquisse8 → Enlèv. mat.-Extru.5 (cut, up to next)
    with BuildSketch(Plane(origin=(0, 4, 0), x_dir=(1, 0, 0), z_dir=(0, 1, 0)), mode=Mode.PRIVATE) as enl_v_mat_extru_5_sk2:
        with Locations((15, -46.32)):
            Circle(ESQUISSE8_R)
    enl_v_mat_extru_5_tool2 = extrude(enl_v_mat_extru_5_sk2.sketch, amount=-ENL_V_MAT_EXTRU_5_REACH, mode=Mode.PRIVATE) & part.part
    add(enl_v_mat_extru_5_tool1.solids().sort_by_distance((-15, 4, 46.32))[0], mode=Mode.SUBTRACT)
    add(enl_v_mat_extru_5_tool2.solids().sort_by_distance((15, 4, 46.32))[0], mode=Mode.SUBTRACT)

    # Congé6
    cong_6_edges = [part.edges().sort_by_distance(p)[0] for p in [
        (-18.5, 2, 46.32),
        (-11.5, 2, 46.32),
        (11.5, 2, 46.32),
        (18.5, 2, 46.32),
    ]]
    fillet(cong_6_edges, radius=CONG_6_R)


solid = part.part
